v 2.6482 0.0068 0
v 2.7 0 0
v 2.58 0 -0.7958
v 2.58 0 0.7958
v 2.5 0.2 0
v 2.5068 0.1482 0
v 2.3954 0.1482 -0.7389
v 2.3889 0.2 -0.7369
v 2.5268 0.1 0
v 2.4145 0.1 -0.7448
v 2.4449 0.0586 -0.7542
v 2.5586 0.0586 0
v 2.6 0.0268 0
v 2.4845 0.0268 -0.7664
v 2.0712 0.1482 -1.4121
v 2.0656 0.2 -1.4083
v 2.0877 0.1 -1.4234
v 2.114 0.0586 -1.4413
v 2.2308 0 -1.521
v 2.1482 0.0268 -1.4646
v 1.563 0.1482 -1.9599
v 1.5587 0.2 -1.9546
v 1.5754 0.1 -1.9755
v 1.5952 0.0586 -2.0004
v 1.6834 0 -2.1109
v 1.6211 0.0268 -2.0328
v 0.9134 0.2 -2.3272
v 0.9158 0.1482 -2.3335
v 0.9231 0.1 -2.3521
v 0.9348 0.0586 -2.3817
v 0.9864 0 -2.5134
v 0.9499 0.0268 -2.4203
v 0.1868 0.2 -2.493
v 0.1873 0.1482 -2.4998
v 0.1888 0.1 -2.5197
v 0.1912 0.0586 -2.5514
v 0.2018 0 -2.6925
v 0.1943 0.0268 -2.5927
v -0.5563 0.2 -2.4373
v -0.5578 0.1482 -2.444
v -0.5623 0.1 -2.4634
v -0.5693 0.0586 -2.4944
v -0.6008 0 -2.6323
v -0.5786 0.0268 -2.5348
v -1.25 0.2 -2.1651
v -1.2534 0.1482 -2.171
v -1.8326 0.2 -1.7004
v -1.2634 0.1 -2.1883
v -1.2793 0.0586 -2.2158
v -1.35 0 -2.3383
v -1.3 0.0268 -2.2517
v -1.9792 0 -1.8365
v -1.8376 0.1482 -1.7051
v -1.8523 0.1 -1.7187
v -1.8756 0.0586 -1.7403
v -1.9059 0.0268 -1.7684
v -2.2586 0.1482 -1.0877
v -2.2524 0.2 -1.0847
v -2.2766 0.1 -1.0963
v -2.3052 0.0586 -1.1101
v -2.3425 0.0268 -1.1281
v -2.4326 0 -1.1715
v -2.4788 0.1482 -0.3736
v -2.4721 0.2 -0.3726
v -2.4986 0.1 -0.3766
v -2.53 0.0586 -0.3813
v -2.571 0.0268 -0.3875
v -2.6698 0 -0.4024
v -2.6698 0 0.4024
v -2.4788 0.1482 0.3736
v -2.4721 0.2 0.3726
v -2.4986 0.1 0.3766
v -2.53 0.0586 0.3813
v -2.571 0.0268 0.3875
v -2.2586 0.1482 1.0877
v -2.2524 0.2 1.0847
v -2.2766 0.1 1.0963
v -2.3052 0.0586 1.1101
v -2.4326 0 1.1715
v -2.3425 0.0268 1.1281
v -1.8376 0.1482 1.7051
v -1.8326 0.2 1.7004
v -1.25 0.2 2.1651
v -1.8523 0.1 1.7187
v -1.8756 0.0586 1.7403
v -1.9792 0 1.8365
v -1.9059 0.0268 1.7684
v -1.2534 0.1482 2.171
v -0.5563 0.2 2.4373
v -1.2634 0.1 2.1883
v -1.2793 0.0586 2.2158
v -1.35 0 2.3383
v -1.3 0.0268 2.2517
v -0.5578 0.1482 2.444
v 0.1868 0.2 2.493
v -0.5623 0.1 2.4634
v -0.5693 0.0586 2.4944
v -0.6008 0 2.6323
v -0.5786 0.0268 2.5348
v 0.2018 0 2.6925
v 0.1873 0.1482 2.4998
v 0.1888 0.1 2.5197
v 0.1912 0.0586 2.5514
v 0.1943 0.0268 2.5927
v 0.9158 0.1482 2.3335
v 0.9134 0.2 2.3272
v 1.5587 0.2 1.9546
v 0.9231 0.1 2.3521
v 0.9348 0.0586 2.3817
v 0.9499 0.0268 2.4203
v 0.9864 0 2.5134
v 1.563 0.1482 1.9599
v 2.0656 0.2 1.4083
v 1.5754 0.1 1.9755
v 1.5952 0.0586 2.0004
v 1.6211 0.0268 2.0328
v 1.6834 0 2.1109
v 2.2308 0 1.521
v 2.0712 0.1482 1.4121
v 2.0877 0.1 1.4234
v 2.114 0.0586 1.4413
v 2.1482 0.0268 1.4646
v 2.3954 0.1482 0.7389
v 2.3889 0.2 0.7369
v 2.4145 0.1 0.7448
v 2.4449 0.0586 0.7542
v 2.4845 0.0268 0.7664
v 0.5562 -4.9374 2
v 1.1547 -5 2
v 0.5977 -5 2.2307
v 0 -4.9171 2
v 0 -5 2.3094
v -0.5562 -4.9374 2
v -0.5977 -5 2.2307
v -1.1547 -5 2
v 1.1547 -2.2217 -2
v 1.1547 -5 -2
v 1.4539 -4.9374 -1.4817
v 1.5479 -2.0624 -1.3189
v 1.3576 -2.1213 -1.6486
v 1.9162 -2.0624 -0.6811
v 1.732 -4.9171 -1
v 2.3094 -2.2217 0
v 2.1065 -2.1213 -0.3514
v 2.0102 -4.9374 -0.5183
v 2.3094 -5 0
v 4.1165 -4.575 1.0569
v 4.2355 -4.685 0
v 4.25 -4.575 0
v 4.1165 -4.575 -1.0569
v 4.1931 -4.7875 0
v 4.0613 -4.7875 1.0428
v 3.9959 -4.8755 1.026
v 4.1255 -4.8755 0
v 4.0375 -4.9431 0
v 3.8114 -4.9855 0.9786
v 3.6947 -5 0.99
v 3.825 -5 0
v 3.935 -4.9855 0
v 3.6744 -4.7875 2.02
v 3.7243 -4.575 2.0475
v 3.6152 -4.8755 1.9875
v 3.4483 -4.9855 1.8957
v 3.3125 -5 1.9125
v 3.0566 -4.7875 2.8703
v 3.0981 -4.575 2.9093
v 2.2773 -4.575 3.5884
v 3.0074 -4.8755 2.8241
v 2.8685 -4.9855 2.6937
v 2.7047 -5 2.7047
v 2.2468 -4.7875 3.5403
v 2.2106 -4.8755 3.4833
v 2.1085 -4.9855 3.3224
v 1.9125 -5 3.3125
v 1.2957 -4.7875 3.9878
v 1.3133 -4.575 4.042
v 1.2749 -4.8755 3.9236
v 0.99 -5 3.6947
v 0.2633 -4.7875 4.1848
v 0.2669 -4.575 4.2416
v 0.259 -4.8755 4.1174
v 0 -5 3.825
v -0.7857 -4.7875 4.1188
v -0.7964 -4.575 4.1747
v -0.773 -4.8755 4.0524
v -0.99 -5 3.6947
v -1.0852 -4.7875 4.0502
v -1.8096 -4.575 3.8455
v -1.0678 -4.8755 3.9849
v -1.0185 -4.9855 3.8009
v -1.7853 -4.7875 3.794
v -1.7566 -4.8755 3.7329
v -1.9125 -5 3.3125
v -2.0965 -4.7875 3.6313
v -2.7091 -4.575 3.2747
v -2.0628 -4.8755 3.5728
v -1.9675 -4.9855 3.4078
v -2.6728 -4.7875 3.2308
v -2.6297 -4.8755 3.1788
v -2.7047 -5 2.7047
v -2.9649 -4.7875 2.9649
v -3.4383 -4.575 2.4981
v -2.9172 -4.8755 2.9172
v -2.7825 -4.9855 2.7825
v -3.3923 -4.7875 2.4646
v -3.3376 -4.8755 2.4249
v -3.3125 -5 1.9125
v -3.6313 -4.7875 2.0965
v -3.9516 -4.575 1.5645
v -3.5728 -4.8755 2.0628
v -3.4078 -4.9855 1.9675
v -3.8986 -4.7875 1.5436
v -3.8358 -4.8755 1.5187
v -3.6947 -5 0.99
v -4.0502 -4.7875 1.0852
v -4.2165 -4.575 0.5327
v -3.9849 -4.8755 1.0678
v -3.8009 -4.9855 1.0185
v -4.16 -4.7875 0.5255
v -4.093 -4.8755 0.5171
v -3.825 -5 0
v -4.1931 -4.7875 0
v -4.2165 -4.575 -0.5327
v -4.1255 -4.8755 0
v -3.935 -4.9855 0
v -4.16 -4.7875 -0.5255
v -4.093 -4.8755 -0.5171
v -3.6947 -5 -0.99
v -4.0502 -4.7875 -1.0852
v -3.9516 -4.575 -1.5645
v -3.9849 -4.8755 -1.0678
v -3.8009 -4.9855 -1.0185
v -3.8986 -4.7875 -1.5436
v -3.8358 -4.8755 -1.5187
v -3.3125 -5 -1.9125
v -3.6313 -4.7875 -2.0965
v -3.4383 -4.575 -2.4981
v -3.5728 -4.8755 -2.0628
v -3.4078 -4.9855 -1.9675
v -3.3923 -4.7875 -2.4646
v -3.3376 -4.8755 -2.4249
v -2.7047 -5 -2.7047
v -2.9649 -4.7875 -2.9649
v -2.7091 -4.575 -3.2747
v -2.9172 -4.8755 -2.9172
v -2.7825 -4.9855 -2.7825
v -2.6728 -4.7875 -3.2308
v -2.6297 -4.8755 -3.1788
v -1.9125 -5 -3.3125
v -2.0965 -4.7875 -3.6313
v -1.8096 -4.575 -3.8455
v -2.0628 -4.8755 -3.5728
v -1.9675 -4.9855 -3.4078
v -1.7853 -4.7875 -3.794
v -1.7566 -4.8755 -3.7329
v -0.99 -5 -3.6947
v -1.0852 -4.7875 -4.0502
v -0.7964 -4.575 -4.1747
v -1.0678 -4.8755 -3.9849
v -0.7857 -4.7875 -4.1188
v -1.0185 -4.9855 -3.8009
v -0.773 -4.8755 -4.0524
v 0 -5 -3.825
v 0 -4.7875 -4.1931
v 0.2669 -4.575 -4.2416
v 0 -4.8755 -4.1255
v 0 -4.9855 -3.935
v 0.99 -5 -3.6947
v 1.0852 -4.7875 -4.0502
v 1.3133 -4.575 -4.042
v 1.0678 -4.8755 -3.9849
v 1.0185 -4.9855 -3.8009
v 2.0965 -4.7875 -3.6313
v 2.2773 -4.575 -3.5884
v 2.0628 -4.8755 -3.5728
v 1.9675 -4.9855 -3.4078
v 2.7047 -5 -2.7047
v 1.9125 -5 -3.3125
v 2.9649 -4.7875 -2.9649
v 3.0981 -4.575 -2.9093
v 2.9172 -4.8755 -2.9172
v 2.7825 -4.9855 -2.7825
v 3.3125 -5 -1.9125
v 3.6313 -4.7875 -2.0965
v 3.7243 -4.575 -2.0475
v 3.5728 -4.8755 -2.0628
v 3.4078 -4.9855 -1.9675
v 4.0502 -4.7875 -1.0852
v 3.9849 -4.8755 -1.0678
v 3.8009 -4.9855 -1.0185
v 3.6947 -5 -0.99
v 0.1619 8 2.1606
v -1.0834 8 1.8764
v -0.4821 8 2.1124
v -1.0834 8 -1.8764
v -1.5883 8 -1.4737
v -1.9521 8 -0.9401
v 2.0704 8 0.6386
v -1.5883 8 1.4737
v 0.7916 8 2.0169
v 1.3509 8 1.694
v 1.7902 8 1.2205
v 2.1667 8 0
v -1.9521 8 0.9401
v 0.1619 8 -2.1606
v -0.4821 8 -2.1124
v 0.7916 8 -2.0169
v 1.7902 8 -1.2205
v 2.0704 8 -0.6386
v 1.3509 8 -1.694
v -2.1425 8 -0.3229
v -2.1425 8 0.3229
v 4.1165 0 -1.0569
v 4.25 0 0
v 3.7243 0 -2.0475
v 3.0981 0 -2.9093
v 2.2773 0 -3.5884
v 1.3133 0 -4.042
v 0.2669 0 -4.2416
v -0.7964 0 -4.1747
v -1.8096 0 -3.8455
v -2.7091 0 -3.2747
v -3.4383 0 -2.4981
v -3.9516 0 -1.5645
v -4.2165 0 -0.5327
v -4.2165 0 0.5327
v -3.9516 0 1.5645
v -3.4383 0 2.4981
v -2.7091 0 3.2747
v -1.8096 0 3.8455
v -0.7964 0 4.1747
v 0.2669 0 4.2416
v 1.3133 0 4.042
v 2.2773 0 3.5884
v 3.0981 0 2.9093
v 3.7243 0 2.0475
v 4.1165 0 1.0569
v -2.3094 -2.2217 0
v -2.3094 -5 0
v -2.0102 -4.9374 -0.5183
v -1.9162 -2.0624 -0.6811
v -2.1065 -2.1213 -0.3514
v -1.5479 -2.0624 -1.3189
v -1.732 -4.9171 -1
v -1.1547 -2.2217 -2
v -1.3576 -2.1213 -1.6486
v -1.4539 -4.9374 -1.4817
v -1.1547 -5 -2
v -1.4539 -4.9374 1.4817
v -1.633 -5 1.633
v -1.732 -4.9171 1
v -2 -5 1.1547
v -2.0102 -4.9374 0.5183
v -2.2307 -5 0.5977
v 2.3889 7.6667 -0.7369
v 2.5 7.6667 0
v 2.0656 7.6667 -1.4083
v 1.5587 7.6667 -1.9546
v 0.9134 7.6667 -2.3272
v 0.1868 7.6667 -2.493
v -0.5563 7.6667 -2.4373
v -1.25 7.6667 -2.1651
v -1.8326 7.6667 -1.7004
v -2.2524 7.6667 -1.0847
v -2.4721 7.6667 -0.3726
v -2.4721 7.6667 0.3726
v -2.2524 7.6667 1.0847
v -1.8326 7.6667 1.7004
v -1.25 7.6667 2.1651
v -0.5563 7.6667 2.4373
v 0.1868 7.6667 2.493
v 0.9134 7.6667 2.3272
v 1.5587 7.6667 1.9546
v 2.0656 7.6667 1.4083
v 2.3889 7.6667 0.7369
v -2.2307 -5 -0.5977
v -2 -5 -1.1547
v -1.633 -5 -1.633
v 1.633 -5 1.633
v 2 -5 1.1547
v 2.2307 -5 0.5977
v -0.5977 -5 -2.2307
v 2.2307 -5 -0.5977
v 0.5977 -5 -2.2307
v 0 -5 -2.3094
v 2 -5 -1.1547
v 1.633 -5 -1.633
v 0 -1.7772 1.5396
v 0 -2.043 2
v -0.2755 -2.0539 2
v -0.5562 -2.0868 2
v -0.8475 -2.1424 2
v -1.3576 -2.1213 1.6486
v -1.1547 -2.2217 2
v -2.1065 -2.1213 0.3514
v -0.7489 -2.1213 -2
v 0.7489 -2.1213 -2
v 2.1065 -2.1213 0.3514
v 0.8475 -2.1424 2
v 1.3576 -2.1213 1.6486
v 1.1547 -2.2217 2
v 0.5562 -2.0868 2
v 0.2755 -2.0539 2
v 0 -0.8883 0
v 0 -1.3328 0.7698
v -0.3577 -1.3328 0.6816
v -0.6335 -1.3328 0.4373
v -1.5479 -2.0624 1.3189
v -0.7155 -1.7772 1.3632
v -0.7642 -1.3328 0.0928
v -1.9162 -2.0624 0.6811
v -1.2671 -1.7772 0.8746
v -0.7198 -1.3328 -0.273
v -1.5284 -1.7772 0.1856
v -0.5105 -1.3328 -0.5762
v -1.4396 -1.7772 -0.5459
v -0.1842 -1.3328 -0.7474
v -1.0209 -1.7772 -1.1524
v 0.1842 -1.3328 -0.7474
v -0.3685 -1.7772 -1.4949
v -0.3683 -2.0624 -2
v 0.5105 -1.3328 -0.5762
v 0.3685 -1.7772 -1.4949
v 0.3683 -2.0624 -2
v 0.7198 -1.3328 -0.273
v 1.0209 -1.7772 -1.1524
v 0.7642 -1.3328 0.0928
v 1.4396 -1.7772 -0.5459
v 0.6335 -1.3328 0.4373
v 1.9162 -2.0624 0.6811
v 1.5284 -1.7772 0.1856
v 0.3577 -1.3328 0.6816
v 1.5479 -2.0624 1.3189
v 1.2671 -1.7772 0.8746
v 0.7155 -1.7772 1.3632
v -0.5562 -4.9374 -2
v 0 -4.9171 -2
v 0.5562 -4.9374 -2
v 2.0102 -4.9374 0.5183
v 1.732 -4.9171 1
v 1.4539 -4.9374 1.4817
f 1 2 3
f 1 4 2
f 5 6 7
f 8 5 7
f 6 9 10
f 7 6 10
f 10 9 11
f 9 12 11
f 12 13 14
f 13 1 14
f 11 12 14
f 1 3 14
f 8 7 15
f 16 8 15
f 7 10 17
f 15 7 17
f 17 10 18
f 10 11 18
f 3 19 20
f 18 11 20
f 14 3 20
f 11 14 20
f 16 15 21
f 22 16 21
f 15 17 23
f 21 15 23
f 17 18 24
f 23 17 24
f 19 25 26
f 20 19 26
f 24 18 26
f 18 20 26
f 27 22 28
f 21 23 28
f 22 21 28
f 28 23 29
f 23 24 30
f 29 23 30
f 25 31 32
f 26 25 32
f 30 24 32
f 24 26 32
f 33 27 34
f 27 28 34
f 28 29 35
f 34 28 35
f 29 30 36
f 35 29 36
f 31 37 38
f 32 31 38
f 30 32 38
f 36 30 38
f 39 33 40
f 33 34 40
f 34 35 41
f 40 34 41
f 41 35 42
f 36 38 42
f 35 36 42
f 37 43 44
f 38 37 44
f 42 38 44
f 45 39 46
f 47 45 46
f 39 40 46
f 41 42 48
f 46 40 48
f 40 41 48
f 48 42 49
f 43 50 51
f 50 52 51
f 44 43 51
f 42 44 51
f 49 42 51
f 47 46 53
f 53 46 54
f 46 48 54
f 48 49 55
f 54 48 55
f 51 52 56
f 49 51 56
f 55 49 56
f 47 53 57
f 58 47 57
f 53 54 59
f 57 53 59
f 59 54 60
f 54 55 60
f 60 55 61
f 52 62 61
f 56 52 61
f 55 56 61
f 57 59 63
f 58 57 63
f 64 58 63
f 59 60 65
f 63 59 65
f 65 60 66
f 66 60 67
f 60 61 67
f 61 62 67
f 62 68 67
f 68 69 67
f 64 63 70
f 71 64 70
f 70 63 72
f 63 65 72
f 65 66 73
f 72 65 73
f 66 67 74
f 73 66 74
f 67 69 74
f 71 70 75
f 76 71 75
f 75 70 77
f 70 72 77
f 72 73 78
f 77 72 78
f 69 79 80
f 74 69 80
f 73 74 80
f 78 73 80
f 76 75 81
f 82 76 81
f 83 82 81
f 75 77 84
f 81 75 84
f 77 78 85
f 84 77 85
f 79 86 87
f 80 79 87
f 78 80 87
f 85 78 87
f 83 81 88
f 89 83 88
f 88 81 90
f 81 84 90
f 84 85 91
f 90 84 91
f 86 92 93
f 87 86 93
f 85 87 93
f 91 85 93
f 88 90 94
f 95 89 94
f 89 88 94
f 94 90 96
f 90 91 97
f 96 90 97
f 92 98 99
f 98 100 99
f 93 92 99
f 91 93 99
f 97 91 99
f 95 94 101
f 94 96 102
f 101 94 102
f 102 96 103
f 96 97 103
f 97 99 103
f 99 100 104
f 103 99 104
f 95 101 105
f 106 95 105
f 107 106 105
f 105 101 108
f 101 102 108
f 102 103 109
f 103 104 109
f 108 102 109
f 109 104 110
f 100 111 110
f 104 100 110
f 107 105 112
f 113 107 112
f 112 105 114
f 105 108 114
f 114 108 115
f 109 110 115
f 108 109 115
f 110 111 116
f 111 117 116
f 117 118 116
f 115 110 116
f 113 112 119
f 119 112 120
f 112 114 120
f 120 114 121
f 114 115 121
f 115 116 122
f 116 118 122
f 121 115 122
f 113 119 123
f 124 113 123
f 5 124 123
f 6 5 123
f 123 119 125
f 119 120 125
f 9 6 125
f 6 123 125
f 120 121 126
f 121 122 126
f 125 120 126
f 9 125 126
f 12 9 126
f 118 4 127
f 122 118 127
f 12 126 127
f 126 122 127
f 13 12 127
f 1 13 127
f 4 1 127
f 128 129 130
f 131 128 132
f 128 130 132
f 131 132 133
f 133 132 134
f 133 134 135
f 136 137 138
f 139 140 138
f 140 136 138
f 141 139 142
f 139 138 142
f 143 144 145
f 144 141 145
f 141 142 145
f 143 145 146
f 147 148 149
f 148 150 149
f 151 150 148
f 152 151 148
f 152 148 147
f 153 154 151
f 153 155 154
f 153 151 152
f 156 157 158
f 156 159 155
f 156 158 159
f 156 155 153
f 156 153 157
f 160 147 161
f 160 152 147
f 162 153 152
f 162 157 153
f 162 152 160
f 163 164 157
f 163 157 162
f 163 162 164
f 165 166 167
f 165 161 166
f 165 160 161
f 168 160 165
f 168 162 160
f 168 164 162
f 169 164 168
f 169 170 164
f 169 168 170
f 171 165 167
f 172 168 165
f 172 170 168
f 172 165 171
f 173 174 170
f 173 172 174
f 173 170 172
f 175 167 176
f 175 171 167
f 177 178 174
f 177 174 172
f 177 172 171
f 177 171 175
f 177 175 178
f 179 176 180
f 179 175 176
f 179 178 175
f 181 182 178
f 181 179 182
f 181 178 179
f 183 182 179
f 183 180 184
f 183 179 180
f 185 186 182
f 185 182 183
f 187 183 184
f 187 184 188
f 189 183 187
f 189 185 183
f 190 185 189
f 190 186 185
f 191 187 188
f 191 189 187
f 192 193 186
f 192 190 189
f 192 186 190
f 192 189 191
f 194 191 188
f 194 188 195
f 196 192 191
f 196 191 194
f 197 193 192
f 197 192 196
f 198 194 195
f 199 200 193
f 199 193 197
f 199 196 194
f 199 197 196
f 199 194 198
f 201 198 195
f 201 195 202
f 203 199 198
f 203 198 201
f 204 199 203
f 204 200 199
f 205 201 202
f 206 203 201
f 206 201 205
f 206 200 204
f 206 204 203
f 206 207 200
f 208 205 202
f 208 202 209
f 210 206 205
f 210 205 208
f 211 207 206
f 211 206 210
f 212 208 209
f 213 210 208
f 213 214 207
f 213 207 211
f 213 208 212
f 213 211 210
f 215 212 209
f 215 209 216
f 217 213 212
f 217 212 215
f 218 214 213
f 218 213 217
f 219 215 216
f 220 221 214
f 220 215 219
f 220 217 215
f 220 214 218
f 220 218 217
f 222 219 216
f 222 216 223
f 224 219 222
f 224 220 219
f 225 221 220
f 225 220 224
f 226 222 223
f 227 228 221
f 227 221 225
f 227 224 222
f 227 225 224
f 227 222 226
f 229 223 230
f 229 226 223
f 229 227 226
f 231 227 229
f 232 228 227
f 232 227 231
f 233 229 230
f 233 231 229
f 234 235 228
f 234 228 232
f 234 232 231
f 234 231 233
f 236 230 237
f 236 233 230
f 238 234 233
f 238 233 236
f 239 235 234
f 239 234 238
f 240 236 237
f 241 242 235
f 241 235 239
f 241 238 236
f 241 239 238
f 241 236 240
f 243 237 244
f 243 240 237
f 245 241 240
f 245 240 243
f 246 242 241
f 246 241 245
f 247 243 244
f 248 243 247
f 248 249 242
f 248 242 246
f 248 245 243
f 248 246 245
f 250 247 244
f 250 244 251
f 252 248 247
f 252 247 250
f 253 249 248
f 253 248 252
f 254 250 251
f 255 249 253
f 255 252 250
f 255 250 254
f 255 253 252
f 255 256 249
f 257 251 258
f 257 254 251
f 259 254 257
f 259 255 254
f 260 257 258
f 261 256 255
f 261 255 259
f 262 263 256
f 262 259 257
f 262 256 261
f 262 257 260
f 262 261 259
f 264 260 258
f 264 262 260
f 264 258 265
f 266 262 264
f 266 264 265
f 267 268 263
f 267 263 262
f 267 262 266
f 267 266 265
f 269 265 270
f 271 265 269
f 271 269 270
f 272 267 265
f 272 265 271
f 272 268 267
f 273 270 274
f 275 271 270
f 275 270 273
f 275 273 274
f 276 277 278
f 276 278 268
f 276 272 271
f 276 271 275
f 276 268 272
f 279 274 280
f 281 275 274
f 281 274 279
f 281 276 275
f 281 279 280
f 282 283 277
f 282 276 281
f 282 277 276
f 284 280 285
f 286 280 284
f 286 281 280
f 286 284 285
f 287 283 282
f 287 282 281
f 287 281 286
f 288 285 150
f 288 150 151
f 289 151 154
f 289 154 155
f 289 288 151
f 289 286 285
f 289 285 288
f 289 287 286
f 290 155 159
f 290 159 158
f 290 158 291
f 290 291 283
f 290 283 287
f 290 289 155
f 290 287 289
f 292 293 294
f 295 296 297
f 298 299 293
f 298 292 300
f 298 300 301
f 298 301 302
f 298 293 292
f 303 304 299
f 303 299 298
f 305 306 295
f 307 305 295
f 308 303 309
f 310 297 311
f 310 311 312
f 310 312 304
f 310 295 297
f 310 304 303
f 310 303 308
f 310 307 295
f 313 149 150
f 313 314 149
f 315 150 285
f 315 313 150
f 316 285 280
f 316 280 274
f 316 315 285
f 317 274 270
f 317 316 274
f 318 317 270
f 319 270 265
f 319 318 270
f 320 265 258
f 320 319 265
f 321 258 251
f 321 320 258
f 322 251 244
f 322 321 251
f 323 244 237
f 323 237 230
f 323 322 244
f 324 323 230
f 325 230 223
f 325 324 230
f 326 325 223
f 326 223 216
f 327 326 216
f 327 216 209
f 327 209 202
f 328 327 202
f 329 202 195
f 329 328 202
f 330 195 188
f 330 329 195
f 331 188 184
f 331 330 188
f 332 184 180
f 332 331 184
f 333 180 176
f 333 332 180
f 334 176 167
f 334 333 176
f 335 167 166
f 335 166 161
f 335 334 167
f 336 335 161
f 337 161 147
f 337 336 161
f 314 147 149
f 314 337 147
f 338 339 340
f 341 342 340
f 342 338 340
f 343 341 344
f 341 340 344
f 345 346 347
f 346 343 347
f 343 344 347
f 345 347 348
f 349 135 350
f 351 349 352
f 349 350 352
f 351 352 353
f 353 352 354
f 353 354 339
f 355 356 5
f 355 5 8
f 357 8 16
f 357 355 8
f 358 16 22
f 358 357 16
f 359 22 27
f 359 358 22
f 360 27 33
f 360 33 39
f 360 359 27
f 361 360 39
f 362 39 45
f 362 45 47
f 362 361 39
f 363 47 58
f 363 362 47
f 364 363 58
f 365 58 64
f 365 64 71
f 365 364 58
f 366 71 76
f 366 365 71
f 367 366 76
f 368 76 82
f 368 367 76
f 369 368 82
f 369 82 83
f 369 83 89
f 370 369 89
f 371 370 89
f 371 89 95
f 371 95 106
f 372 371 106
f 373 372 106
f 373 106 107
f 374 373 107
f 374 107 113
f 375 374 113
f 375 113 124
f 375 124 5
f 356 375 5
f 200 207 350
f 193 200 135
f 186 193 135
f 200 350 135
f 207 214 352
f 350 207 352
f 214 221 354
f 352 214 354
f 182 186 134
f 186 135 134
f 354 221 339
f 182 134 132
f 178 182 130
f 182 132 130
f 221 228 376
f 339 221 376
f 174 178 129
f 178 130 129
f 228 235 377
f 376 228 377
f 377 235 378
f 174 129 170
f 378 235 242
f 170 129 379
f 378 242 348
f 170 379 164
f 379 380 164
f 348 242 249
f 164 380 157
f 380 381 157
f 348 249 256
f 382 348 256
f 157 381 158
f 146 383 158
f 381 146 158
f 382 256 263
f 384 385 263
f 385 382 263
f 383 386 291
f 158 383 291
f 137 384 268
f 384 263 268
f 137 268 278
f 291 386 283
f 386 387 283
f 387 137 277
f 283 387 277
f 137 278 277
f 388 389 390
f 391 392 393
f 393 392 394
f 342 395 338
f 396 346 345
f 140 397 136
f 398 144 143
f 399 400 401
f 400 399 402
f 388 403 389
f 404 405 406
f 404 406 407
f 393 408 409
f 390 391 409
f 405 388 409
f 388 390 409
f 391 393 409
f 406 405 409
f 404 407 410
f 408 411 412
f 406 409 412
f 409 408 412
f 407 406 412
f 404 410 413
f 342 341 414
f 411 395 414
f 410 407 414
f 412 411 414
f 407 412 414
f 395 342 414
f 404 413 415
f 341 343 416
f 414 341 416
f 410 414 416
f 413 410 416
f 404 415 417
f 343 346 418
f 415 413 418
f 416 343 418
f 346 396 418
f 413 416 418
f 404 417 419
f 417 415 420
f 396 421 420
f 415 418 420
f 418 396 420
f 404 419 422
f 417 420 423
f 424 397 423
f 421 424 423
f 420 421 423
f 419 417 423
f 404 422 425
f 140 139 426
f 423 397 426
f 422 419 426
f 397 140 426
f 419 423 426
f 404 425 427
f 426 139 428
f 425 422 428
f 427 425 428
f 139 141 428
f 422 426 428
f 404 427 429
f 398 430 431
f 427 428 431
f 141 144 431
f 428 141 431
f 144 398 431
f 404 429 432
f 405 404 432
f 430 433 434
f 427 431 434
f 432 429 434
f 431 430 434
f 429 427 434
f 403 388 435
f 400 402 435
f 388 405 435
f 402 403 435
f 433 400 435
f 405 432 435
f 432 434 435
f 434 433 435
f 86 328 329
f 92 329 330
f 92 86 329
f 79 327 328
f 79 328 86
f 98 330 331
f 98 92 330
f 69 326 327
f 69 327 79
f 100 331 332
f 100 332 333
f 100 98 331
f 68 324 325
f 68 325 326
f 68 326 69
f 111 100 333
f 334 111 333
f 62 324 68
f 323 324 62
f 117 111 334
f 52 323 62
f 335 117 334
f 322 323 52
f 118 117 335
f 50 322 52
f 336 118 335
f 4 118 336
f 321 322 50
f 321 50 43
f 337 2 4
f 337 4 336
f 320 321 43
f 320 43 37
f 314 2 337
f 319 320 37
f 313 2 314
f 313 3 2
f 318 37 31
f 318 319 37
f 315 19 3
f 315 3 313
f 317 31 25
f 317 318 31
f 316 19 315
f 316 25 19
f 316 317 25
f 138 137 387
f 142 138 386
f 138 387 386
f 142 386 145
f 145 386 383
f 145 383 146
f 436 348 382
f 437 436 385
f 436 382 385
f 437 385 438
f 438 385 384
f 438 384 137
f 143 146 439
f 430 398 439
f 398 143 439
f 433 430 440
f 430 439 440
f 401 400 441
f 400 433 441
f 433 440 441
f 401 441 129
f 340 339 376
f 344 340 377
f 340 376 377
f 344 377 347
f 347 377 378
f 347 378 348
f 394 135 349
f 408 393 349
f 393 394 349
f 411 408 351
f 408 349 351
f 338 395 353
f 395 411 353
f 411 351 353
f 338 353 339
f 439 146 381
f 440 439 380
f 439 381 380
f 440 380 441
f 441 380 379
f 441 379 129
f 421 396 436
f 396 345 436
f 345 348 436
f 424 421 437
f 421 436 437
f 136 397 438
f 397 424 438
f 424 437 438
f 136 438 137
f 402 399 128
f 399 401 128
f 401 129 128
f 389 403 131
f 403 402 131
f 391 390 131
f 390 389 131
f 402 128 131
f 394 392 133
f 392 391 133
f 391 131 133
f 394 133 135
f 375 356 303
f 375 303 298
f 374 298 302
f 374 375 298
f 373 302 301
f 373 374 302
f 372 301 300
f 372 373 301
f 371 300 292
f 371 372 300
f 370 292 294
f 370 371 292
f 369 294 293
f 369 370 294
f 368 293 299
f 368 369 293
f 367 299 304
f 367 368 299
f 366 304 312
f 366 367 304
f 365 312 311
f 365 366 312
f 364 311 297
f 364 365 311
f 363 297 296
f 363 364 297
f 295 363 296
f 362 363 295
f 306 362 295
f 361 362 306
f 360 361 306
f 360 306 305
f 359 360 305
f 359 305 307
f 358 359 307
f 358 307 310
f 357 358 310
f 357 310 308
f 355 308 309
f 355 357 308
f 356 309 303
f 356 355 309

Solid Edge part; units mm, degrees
sketch "Sketch1" plane through (0, 0, 0) normal (0, 0, 1) x (1, 0, 0)
  line L0 (2.5, 0) -> (2.5, 8)
  line L1 (0, 8) -> (2.5, 8)
  line L2 (0, 0) -> (0, 8)
  line L3 (0, 0) -> (0, -5)
  line L4 (0, -5) -> (4.25, -5)
  line L5 (4.25, -5) -> (4.25, 0)
  line L6 (4.25, 0) -> (2.5, 0)
revolve "RevolvedProtrusion1" add sketch "Sketch1" angle 360 about axis through (0, 0, 0) along (0, 1, 0)
sketch "Sketch2" plane through (0, 0, 0) normal (1, 0, 0) x (0, 1, 0)
  line L0 (-5, 2.7915) -> (-2.5, 2.7915)
  line L1 (-0.8883, 0) -> (-2.5, 2.7915)
  line L2 (-5, 0) -> (-0.8883, 0)
  line L3 (-5, 0) -> (-5, 2.7915)
revolve "RevolvedCutout1" cut sketch "Sketch2" angle 360 about axis through (0, -4.5, 0) along (0, 1, 0)
sketch "Sketch3" plane through (0, -5, 0) normal (0, -1, 0) x (0, 0, 1)
  circle A0 centre (0, 0) radius 2.7915
  line L0 (-2, -1.1547) -> (0, -2.3094)
  line L1 (0, -2.3094) -> (2, -1.1547)
  line L2 (2, -1.1547) -> (2, 1.1547)
  line L3 (2, 1.1547) -> (0, 2.3094)
  line L4 (0, 2.3094) -> (-2, 1.1547)
  line L5 (-2, 1.1547) -> (-2, -1.1547)
  dimension "D1" = 4
extrude "Protrusion1" add sketch "Sketch3" against normal up to next
sketch "Sketch4" plane through (0, 0, 0) normal (0, 0, 1) x (1, 0, 0)
  line L0 (-2.3094, -5) -> (0, -5)
  line L1 (0, -5) -> (0, -4.3812)
  line L2 (0, -4.3812) -> (-2.3094, -5)
revolve "RevolvedCutout2" cut sketch "Sketch4" angle 360 about axis through (0, -4.5, 0) along (0, 1, 0)
fillet "Round1" radius 0.2 1 edges at (0, 0, -2.5)
fillet "Round2" radius 0.425 1 edges at (0, -5, -4.25)
chamfer "倒斜角_2" distance 0.3333 angle 45 1 edges at (0, 8, -2.5)
cosmetic_thread "螺纹_3" size "M5" thread depth 6.4
